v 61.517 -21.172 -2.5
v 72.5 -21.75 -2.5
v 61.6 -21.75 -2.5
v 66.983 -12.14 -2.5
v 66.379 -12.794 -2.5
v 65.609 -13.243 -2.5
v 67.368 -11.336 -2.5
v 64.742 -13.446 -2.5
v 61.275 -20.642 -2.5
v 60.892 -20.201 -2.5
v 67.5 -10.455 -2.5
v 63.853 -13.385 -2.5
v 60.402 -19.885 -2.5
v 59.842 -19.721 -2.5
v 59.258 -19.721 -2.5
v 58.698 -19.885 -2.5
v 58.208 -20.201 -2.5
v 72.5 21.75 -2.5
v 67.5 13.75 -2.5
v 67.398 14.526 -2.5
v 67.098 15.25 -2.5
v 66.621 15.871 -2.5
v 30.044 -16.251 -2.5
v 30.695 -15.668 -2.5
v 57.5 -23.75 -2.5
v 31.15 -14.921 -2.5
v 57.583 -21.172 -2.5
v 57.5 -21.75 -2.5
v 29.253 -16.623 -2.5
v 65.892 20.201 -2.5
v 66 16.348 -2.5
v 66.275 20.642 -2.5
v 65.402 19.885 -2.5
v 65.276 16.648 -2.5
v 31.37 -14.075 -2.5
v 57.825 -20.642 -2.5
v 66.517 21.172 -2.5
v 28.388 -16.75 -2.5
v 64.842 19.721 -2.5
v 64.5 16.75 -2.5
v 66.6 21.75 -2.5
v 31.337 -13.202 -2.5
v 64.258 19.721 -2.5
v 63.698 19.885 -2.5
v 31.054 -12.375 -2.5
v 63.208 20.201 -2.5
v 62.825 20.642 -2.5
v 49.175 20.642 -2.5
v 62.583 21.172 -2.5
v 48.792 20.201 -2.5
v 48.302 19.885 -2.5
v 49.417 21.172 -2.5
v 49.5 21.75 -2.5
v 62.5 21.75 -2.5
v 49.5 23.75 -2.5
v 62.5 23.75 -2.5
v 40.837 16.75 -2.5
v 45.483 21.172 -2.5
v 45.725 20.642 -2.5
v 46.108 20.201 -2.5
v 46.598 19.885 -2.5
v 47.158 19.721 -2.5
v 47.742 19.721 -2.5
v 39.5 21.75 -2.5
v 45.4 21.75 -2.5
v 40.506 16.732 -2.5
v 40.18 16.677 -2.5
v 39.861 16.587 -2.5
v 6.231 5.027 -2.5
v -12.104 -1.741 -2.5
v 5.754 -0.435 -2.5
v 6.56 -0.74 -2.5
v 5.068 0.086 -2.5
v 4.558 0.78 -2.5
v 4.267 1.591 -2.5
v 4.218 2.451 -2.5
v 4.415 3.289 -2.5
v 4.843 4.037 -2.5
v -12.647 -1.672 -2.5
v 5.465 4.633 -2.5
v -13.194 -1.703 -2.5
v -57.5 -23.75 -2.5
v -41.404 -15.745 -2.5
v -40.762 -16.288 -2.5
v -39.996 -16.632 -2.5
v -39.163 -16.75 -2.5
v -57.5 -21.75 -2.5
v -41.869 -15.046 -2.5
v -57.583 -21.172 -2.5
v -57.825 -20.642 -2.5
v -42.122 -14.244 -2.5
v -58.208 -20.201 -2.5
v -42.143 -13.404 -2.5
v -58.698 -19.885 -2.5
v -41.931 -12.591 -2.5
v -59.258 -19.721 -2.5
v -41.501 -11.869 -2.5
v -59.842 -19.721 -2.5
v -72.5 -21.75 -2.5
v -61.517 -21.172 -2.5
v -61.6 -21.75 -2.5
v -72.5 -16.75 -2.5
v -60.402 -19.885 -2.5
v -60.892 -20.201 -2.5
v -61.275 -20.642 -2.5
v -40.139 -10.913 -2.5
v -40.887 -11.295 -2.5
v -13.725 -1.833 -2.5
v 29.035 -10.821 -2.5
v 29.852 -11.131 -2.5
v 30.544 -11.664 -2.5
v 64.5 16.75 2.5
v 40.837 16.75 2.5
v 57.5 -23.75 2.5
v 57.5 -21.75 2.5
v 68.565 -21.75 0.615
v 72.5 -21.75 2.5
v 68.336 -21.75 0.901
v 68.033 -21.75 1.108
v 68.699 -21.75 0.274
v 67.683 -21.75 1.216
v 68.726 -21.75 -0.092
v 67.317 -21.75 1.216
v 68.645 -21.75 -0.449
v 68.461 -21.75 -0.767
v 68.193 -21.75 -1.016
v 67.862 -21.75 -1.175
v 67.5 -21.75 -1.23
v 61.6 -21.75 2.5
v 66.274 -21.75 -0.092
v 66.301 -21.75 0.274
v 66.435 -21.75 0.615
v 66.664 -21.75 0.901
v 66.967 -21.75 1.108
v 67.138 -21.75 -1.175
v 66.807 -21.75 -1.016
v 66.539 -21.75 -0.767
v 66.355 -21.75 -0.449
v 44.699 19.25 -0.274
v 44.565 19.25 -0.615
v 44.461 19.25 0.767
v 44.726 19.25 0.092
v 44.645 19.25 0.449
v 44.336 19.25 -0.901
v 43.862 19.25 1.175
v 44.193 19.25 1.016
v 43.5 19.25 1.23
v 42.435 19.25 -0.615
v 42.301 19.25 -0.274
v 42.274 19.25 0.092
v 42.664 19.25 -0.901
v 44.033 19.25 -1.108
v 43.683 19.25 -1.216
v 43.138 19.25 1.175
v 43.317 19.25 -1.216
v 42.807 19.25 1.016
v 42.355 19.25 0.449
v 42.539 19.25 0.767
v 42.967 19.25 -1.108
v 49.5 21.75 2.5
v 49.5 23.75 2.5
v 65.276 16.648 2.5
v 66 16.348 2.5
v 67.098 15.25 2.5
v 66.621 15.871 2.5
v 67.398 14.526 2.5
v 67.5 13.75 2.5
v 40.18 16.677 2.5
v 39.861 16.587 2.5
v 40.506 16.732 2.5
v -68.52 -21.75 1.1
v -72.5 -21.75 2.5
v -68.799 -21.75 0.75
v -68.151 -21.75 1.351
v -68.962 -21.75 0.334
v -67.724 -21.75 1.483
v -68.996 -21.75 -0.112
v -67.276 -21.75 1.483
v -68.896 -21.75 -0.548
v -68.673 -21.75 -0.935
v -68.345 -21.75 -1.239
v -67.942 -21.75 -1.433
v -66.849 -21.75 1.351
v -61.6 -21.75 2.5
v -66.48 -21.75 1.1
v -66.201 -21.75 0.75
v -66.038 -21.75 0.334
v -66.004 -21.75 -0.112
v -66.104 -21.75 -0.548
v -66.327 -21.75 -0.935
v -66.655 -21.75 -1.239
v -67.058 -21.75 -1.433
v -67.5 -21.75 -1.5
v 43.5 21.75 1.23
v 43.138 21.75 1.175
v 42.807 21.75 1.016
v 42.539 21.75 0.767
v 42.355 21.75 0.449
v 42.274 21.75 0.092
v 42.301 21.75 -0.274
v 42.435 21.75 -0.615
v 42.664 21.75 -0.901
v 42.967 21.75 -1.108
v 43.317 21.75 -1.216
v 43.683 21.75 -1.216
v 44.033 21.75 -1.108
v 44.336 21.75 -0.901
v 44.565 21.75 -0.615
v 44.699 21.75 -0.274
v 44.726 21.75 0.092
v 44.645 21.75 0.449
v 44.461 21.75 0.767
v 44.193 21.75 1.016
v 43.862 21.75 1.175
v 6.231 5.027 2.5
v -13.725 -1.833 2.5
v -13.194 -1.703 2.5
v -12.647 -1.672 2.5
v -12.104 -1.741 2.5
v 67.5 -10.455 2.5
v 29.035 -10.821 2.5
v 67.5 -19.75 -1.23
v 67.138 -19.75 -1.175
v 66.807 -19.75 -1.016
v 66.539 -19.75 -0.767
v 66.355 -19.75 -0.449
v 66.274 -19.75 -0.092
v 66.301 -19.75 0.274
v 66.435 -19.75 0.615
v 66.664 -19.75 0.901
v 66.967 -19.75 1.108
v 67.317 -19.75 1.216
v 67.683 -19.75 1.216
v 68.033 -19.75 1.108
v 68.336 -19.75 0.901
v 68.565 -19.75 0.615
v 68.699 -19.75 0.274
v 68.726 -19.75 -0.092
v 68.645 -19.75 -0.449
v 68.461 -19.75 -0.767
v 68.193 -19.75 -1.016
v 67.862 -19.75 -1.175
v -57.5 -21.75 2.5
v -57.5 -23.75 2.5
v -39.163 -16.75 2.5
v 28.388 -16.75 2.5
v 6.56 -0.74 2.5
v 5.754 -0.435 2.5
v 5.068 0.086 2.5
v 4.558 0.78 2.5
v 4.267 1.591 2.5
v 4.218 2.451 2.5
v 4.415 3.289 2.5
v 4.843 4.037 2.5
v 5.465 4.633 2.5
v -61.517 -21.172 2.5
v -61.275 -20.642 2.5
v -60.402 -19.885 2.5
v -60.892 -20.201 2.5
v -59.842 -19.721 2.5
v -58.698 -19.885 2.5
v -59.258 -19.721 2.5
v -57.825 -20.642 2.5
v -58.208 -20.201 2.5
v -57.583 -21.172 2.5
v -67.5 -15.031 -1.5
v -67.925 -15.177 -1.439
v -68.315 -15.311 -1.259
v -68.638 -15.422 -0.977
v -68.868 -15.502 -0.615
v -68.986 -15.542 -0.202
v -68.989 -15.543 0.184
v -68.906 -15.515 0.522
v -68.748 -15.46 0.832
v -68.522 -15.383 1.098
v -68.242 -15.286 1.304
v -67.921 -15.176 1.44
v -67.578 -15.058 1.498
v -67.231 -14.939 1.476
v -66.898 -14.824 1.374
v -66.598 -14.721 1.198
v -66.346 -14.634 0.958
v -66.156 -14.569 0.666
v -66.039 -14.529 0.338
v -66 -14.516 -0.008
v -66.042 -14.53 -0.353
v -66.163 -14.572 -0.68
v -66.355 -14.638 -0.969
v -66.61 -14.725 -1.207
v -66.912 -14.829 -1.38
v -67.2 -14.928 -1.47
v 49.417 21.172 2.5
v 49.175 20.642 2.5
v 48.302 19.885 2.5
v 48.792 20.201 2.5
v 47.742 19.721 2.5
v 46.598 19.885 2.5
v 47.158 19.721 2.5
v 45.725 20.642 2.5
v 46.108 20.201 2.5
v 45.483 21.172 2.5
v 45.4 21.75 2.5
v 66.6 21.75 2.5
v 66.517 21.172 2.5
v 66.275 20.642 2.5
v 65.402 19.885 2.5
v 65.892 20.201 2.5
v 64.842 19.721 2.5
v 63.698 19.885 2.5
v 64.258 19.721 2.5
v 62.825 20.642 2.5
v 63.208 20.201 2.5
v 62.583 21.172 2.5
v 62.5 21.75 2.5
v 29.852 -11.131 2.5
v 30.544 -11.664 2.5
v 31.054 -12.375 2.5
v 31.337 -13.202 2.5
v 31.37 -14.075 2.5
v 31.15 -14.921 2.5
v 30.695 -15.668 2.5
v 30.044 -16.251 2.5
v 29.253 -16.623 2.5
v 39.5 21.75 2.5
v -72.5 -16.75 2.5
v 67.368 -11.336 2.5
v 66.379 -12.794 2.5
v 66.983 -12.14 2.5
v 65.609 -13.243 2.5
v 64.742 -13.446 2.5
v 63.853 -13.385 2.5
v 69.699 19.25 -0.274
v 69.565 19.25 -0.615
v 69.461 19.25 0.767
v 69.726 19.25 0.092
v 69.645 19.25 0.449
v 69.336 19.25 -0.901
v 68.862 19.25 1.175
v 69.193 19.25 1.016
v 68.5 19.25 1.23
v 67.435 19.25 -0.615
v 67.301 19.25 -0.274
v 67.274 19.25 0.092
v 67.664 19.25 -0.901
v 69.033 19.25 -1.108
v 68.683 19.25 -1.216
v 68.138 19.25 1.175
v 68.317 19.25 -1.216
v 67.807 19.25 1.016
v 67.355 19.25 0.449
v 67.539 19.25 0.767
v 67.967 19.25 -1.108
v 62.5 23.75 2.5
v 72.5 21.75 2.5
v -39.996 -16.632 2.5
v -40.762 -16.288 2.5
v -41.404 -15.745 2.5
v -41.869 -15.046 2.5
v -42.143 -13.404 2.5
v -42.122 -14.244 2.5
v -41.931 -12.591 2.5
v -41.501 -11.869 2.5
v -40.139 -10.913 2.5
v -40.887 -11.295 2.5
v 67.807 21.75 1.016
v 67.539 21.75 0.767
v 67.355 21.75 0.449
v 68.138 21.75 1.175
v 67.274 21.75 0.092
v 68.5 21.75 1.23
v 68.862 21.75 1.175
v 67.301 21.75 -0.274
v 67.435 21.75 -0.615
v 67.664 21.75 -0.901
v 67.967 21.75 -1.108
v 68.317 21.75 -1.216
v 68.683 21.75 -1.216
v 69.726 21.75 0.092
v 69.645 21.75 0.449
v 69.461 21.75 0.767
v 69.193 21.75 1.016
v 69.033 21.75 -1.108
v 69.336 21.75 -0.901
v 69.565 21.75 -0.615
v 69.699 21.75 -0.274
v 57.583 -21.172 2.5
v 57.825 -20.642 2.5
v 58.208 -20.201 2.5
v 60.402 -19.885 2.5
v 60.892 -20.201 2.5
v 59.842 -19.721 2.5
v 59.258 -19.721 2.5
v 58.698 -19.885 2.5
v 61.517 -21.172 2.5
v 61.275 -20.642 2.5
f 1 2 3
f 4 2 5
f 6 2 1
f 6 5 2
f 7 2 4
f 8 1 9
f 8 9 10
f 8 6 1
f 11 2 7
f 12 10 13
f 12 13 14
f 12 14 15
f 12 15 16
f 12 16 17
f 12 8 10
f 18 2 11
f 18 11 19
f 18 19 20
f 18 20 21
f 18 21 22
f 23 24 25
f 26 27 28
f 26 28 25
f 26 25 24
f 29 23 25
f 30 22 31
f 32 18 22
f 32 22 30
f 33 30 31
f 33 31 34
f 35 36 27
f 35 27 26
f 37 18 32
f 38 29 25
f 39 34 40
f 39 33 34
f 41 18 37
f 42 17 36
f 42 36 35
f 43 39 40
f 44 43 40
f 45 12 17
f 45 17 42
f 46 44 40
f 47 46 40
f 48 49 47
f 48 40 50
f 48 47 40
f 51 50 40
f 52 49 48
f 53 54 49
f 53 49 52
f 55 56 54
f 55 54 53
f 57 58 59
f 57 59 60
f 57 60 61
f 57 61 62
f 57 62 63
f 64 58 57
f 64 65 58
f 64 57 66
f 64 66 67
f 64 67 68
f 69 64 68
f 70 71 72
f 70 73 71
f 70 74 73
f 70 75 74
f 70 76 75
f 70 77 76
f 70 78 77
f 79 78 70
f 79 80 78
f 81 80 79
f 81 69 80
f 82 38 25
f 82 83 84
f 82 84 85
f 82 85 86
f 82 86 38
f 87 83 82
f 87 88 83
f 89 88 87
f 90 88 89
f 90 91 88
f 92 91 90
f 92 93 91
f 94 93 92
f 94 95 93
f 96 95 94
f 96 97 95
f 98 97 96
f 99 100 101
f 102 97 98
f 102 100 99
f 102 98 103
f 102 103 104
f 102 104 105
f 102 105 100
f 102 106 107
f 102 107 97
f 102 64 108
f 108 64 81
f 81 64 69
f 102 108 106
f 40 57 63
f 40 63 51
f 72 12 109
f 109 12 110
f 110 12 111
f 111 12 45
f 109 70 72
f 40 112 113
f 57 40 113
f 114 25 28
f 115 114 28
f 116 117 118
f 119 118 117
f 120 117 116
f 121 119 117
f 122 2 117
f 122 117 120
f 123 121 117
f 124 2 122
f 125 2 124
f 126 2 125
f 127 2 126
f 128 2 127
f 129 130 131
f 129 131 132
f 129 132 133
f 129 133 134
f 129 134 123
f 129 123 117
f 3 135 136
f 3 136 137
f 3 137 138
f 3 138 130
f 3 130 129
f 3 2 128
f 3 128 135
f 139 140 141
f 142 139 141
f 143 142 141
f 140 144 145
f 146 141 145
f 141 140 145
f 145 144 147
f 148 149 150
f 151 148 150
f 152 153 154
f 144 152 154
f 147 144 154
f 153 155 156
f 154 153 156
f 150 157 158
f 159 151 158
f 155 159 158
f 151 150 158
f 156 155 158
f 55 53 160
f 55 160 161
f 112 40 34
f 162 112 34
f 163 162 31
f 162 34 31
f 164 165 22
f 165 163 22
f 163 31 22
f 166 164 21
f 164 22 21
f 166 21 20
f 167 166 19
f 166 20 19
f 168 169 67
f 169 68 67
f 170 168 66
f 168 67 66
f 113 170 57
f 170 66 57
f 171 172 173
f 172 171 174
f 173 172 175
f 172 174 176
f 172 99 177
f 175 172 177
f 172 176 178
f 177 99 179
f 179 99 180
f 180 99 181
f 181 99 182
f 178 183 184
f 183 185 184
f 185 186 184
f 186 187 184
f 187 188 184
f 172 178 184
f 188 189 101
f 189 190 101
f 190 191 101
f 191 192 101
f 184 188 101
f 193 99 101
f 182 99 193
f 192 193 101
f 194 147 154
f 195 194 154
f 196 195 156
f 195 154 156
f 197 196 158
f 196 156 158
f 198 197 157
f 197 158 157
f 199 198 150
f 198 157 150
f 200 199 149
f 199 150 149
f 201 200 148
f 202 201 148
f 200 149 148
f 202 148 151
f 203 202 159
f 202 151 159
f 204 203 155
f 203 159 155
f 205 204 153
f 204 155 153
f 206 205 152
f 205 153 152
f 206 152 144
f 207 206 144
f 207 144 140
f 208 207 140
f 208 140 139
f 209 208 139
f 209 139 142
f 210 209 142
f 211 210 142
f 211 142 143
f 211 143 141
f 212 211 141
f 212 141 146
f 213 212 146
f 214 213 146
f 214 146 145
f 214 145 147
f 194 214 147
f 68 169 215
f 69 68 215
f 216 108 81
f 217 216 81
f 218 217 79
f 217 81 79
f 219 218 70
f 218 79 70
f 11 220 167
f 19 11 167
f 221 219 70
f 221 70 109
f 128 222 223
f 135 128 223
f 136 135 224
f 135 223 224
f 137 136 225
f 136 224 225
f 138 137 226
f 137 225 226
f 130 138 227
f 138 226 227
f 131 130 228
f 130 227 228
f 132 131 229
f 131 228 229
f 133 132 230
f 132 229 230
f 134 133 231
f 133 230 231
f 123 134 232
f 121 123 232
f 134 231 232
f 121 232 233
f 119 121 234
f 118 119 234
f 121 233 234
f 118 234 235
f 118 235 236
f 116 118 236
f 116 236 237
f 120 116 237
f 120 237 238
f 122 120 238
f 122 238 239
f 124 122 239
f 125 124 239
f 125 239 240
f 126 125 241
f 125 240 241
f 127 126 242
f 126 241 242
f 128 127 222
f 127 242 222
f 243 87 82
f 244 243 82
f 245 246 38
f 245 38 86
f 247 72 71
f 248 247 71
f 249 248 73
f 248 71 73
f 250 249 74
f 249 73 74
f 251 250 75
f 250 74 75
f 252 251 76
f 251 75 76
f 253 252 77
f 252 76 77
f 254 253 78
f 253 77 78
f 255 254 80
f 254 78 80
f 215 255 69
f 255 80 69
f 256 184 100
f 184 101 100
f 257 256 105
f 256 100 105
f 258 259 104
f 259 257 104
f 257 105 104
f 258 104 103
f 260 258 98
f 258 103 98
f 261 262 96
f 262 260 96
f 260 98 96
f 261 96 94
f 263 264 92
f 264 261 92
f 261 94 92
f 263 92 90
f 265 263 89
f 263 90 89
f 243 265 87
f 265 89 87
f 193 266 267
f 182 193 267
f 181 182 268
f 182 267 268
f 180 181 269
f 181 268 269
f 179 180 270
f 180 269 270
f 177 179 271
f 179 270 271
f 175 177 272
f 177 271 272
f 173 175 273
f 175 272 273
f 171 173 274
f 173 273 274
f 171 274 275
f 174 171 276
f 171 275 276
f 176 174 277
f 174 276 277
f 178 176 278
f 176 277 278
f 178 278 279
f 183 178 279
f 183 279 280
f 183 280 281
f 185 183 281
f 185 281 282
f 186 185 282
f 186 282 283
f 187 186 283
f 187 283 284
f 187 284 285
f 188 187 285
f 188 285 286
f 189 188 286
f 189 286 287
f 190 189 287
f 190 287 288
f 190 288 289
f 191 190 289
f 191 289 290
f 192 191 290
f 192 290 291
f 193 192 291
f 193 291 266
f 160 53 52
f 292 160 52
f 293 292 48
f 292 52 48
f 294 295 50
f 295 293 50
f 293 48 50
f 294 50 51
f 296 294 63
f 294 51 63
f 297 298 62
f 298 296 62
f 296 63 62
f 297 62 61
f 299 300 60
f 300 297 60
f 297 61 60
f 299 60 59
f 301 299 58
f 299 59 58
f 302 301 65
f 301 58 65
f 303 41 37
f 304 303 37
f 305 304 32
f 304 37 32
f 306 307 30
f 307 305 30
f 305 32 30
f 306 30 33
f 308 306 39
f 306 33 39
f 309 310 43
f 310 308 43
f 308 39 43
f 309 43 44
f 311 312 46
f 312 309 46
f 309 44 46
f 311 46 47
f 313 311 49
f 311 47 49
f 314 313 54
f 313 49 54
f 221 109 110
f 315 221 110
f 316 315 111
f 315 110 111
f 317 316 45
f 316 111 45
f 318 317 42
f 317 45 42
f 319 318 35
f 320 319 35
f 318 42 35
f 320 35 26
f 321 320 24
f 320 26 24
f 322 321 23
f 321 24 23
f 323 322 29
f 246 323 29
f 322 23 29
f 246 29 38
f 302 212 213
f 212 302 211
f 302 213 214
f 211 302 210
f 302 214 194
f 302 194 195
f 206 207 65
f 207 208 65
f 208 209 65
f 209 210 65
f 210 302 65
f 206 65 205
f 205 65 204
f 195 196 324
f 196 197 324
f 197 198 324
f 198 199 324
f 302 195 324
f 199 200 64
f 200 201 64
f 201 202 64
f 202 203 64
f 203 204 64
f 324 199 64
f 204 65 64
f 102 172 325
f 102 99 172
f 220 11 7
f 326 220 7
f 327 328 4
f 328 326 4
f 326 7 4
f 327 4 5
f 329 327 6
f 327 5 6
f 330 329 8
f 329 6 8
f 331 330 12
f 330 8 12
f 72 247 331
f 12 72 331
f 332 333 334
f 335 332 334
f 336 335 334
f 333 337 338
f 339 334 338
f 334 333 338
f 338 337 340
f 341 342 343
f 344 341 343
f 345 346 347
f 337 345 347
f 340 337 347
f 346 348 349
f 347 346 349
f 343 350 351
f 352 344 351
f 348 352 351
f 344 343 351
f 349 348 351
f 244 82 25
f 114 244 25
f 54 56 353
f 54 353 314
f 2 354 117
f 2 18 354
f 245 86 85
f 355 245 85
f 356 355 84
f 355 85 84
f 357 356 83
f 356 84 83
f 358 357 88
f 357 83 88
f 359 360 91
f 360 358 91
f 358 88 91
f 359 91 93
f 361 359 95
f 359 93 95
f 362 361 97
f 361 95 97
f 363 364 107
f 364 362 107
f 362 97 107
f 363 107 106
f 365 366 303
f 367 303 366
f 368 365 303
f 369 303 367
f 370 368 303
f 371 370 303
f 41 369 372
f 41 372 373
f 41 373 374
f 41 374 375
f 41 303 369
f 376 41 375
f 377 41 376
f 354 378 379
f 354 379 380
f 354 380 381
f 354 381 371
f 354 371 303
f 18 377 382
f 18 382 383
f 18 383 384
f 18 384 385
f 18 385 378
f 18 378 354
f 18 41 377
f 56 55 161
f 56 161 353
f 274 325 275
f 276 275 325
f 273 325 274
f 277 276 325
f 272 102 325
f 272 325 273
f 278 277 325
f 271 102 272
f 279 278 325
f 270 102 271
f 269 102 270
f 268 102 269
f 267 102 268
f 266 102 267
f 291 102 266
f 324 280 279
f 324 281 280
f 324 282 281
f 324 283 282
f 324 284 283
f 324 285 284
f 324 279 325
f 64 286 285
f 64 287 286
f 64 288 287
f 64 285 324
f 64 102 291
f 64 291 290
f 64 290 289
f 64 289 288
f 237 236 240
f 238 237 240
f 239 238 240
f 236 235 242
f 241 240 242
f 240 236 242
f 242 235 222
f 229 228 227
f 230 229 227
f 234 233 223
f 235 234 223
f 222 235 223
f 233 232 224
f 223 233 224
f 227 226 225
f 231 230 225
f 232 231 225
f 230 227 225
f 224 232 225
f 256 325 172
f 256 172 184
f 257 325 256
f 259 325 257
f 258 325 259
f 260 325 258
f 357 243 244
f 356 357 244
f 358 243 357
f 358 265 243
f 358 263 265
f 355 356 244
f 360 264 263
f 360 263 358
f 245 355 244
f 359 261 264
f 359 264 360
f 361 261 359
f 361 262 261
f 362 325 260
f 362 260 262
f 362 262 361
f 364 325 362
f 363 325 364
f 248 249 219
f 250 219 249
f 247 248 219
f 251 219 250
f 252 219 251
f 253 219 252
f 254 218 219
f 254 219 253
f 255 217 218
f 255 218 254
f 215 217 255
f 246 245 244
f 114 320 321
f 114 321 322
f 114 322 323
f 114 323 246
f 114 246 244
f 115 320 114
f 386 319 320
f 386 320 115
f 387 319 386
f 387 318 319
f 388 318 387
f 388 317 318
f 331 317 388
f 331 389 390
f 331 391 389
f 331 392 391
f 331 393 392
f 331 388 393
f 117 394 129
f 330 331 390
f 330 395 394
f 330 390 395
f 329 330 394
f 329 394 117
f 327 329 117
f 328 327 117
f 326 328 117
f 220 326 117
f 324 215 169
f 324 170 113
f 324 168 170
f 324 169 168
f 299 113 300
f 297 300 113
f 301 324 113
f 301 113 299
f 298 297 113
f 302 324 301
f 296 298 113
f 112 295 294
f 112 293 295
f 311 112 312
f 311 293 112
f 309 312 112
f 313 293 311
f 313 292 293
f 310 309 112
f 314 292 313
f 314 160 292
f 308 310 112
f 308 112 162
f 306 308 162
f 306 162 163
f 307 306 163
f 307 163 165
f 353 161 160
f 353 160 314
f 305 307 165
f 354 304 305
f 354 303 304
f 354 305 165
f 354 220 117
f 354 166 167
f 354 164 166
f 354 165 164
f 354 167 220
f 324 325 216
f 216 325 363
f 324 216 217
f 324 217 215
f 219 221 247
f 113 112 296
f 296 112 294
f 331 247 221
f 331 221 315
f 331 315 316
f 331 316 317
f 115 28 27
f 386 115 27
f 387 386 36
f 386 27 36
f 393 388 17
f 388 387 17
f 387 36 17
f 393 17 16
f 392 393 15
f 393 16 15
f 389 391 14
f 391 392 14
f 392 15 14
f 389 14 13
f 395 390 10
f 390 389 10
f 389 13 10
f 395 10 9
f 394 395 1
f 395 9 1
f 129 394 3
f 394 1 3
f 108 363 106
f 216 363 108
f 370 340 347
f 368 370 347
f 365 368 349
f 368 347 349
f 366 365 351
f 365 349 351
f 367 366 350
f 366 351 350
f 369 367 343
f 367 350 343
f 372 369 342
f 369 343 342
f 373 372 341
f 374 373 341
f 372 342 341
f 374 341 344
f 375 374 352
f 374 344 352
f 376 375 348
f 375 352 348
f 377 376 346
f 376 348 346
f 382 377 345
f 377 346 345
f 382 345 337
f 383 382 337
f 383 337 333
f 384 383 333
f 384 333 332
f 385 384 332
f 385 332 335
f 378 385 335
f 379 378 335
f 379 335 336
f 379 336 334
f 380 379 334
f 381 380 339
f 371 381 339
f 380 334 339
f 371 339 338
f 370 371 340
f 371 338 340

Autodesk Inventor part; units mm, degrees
ref_plane "YZ Plane" through (0, 0, 0) normal (1, 0, 0) x (0, 1, 0)
ref_plane "XZ Plane" through (0, 0, 0) normal (0, 1, 0) x (-1, 0, 0)
ref_plane "XY Plane" through (0, 0, 0) normal (0, 0, 1) x (1, 0, 0)
sketch "スケッチ1" plane through (0, 0, 0) normal (0, 0, 1) x (1, 0, 0)
  line L0 (-72.5, -21.75) -> (72.5, -21.75) construction
  line L1 (72.5, -21.75) -> (72.5, 21.75) construction
  line L2 (72.5, 21.75) -> (-72.5, 21.75) construction
  line L3 (-72.5, 21.75) -> (-72.5, -21.75) construction
  line L4 (-72.5, -21.75) -> (72.5, 21.75) construction
  line L5 (72.5, -21.75) -> (-72.5, 21.75) construction
  line L6 (-67.5, 21.75) -> (-67.5, -21.75) construction
  line L7 (0, 0) -> (0, 21.75) construction
  line L8 (0, 0) -> (-72.5, 0) construction
  line L9 (67.5, 21.75) -> (67.5, -21.75) construction
  line L10 (-72.5, -21.75) -> (-61.6, -21.75)
  line L11 (49.5, 21.75) -> (49.5, 23.75)
  line L12 (49.5, 23.75) -> (62.5, 23.75)
  line L13 (62.5, 23.75) -> (62.5, 21.75)
  line L14 (66.6, 21.75) -> (72.5, 21.75)
  line L15 (72.5, 21.75) -> (72.5, -21.75)
  line L16 (72.5, -21.75) -> (61.6, -21.75)
  line L17 (-57.5, -21.75) -> (-57.5, -23.75)
  line L18 (-57.5, -23.75) -> (57.5, -23.75)
  line L19 (57.5, -23.75) -> (57.5, -21.75)
  arc A0 (45.4, 21.75) -> (49.5, 21.75) centre (47.45, 21.75) ccw
  arc A1 (62.5, 21.75) -> (66.6, 21.75) centre (64.55, 21.75) ccw
  arc A2 (-57.5, -21.75) -> (-61.6, -21.75) centre (-59.55, -21.75) ccw
  arc A3 (61.6, -21.75) -> (57.5, -21.75) centre (59.55, -21.75) ccw
  line L20 (-72.5, -21.75) -> (-72.5, -16.75)
  line L21 (-72.5, -16.75) -> (39.5, 21.75)
  line L22 (45.4, 21.75) -> (39.5, 21.75)
  line L23 (66.95, 24.476) -> (70.05, 24.476) construction
  line L24 (70.05, 24.476) -> (70.05, 13.3235) construction
  line L25 (70.05, 13.3235) -> (66.95, 13.3235) construction
  line L26 (66.95, 13.3235) -> (66.95, 24.476) construction
  line L27 (68.5, 24.476) -> (68.5, 13.3235) construction
  line L28 (41.95, 24.476) -> (45.05, 24.476) construction
  line L29 (45.05, 24.476) -> (45.05, 13.9945) construction
  line L30 (45.05, 13.9945) -> (41.95, 13.9945) construction
  line L31 (41.95, 13.9945) -> (41.95, 24.476) construction
  line L32 (43.5, 24.476) -> (43.5, 13.9945) construction
  dimension "d16" = 5
  dimension "d20" = 43.5
  dimension "d40" = 135
  dimension "d41" = 10
  dimension "d42" = 2.05
  dimension "d43" = 2
  dimension "d44" = 5
  dimension "d45" = 10
  dimension "d46" = 10
  dimension "d48" = 3.1
  dimension "d50" = 4
  dimension "d51" = 25
  dimension "d52" = 3.1
  dimension "d62" = 6
  dimension "d63" = 6
extrude "押し出し1" add sketch "スケッチ1" along normal blind 2.5
mirror "ミラー1" about plane through (8.4049, -6.8572, 0) normal (0, 0, -1) of "押し出し1"
sketch "スケッチ2" plane through (-72.5, -21.75, 2.5) normal (0, -1, 0) x (1, 0, 0)
  line L0 (0, -5) -> (0, 0)
  line L1 (15, -5) -> (130, -5) construction
  line L2 (72.5, -5) -> (72.5, 0) construction
  line L3 (15, 0) -> (130, 0) construction
  point P0 (72.5, -2.5)
  point P1 (140, -2.5)
  point P2 (0, -2.5)
hole "穴1" at (67.5, -21.75, 0) direction (0, 1, 0) diameter 2.459 depth 2 thread size "M3x0.5" class "6H" standard "ISO Metric profile"
sketch "スケッチ4" plane through (66.6, 21.75, 2.5) normal (0, 1, 0) x (1, 0, 0)
  line L0 (5.9, 5) -> (5.9, 0) projected
  point P0 (-66.6, 2.5)
  point P1 (1.9, 2.5)
  point P2 (-23.1, 2.5)
  point P3 (5.9, 2.5)
  dimension "d53" = 4
  dimension "d54" = 25
hole "穴2" at (68.5, 21.75, 0) at (43.5, 21.75, 0) direction (0, -1, 0) diameter 2.459 depth 2.5 thread size "M3x0.5" class "6H" standard "ISO Metric profile"
sketch "スケッチ6" plane through (0, 0, 2.5) normal (0, 0, 1) x (1, 0, 0)
  line L0 (61.6, -21.75) -> (72.5, -21.75) projected
  line L1 (72.5, -21.75) -> (72.5, 21.75) projected
  line L2 (72.5, 21.75) -> (66.6, 21.75) projected
  line L3 (39.5, 21.75) -> (-72.5, -16.75) projected
  line L4 (67.5, 16.75) -> (67.5, -16.75) construction
  line L5 (67.5, -16.75) -> (-57.1192, -16.75) construction
  line L6 (-57.1192, -16.75) -> (40.3354, 16.75) construction
  line L7 (40.3354, 16.75) -> (67.5, 16.75) construction
  line L8 (67.5, -16.75) -> (-8.3919, 0) construction
  line L9 (67.5, -14.1898) -> (67.5, 16.75)
  line L10 (67.5, 16.75) -> (40.3354, 16.75)
  line L11 (40.3354, 16.75) -> (-3.8563, 1.5591)
  line L12 (-3.8563, 1.5591) -> (67.5, -14.1898)
  line L13 (55.9002, -16.75) -> (-57.1192, -16.75)
  line L14 (-57.1192, -16.75) -> (-12.9275, -1.5591)
  line L15 (-12.9275, -1.5591) -> (55.9002, -16.75)
  point P0 (0, 0)
  dimension "d72" = 5
  dimension "d73" = 5
  dimension "d74" = 5
  dimension "d75" = 5
  dimension "d76" = 5
extrude "押し出し4" cut sketch "スケッチ6" against normal blind 10
fillet "フィレット3" radius 3 7 edges at (-3.8563, 1.5591, 0) (40.3354, 16.75, 0) (67.5, -14.1898, 0) (55.9002, -16.75, 0) (-12.9275, -1.5591, 0) (-57.1192, -16.75, 0) (67.5, 16.75, 0)
sketch "スケッチ7" plane through (-72.5, -21.75, 2.5) normal (0, -1, 0) x (1, 0, 0)
  line L0 (0, 0) -> (0, -5) projected
  line L1 (15, 0) -> (130, 0) projected
  line L2 (15, -5) -> (130, -5) projected
  line L3 (0, -2.5) -> (5, -2.5)
  point P0 (72.5, -2.5)
  dimension "d80" = 5
hole "穴3" at (-67.5, -21.75, 0) direction (0, 1, 0) diameter 3 end through all
equation "\"d16\" = d4"
equation "\"d40\" = d6"
equation "\"d41\" = d3"
equation "\"d46\" = d45"
equation "\"d63\" = d62"
equation "\"d53\" = d50"
equation "\"d54\" = d51"
equation "\"d73\" = d72"
equation "\"d74\" = d73"
equation "\"d75\" = d74"
equation "\"d76\" = d74"
equation "\"d4\" = 5"
equation "\"d6\" = 135"
equation "\"d3\" = 10"
properties part number "ForeArm_vertical_frame01" material "アセタール樹脂、黒"
